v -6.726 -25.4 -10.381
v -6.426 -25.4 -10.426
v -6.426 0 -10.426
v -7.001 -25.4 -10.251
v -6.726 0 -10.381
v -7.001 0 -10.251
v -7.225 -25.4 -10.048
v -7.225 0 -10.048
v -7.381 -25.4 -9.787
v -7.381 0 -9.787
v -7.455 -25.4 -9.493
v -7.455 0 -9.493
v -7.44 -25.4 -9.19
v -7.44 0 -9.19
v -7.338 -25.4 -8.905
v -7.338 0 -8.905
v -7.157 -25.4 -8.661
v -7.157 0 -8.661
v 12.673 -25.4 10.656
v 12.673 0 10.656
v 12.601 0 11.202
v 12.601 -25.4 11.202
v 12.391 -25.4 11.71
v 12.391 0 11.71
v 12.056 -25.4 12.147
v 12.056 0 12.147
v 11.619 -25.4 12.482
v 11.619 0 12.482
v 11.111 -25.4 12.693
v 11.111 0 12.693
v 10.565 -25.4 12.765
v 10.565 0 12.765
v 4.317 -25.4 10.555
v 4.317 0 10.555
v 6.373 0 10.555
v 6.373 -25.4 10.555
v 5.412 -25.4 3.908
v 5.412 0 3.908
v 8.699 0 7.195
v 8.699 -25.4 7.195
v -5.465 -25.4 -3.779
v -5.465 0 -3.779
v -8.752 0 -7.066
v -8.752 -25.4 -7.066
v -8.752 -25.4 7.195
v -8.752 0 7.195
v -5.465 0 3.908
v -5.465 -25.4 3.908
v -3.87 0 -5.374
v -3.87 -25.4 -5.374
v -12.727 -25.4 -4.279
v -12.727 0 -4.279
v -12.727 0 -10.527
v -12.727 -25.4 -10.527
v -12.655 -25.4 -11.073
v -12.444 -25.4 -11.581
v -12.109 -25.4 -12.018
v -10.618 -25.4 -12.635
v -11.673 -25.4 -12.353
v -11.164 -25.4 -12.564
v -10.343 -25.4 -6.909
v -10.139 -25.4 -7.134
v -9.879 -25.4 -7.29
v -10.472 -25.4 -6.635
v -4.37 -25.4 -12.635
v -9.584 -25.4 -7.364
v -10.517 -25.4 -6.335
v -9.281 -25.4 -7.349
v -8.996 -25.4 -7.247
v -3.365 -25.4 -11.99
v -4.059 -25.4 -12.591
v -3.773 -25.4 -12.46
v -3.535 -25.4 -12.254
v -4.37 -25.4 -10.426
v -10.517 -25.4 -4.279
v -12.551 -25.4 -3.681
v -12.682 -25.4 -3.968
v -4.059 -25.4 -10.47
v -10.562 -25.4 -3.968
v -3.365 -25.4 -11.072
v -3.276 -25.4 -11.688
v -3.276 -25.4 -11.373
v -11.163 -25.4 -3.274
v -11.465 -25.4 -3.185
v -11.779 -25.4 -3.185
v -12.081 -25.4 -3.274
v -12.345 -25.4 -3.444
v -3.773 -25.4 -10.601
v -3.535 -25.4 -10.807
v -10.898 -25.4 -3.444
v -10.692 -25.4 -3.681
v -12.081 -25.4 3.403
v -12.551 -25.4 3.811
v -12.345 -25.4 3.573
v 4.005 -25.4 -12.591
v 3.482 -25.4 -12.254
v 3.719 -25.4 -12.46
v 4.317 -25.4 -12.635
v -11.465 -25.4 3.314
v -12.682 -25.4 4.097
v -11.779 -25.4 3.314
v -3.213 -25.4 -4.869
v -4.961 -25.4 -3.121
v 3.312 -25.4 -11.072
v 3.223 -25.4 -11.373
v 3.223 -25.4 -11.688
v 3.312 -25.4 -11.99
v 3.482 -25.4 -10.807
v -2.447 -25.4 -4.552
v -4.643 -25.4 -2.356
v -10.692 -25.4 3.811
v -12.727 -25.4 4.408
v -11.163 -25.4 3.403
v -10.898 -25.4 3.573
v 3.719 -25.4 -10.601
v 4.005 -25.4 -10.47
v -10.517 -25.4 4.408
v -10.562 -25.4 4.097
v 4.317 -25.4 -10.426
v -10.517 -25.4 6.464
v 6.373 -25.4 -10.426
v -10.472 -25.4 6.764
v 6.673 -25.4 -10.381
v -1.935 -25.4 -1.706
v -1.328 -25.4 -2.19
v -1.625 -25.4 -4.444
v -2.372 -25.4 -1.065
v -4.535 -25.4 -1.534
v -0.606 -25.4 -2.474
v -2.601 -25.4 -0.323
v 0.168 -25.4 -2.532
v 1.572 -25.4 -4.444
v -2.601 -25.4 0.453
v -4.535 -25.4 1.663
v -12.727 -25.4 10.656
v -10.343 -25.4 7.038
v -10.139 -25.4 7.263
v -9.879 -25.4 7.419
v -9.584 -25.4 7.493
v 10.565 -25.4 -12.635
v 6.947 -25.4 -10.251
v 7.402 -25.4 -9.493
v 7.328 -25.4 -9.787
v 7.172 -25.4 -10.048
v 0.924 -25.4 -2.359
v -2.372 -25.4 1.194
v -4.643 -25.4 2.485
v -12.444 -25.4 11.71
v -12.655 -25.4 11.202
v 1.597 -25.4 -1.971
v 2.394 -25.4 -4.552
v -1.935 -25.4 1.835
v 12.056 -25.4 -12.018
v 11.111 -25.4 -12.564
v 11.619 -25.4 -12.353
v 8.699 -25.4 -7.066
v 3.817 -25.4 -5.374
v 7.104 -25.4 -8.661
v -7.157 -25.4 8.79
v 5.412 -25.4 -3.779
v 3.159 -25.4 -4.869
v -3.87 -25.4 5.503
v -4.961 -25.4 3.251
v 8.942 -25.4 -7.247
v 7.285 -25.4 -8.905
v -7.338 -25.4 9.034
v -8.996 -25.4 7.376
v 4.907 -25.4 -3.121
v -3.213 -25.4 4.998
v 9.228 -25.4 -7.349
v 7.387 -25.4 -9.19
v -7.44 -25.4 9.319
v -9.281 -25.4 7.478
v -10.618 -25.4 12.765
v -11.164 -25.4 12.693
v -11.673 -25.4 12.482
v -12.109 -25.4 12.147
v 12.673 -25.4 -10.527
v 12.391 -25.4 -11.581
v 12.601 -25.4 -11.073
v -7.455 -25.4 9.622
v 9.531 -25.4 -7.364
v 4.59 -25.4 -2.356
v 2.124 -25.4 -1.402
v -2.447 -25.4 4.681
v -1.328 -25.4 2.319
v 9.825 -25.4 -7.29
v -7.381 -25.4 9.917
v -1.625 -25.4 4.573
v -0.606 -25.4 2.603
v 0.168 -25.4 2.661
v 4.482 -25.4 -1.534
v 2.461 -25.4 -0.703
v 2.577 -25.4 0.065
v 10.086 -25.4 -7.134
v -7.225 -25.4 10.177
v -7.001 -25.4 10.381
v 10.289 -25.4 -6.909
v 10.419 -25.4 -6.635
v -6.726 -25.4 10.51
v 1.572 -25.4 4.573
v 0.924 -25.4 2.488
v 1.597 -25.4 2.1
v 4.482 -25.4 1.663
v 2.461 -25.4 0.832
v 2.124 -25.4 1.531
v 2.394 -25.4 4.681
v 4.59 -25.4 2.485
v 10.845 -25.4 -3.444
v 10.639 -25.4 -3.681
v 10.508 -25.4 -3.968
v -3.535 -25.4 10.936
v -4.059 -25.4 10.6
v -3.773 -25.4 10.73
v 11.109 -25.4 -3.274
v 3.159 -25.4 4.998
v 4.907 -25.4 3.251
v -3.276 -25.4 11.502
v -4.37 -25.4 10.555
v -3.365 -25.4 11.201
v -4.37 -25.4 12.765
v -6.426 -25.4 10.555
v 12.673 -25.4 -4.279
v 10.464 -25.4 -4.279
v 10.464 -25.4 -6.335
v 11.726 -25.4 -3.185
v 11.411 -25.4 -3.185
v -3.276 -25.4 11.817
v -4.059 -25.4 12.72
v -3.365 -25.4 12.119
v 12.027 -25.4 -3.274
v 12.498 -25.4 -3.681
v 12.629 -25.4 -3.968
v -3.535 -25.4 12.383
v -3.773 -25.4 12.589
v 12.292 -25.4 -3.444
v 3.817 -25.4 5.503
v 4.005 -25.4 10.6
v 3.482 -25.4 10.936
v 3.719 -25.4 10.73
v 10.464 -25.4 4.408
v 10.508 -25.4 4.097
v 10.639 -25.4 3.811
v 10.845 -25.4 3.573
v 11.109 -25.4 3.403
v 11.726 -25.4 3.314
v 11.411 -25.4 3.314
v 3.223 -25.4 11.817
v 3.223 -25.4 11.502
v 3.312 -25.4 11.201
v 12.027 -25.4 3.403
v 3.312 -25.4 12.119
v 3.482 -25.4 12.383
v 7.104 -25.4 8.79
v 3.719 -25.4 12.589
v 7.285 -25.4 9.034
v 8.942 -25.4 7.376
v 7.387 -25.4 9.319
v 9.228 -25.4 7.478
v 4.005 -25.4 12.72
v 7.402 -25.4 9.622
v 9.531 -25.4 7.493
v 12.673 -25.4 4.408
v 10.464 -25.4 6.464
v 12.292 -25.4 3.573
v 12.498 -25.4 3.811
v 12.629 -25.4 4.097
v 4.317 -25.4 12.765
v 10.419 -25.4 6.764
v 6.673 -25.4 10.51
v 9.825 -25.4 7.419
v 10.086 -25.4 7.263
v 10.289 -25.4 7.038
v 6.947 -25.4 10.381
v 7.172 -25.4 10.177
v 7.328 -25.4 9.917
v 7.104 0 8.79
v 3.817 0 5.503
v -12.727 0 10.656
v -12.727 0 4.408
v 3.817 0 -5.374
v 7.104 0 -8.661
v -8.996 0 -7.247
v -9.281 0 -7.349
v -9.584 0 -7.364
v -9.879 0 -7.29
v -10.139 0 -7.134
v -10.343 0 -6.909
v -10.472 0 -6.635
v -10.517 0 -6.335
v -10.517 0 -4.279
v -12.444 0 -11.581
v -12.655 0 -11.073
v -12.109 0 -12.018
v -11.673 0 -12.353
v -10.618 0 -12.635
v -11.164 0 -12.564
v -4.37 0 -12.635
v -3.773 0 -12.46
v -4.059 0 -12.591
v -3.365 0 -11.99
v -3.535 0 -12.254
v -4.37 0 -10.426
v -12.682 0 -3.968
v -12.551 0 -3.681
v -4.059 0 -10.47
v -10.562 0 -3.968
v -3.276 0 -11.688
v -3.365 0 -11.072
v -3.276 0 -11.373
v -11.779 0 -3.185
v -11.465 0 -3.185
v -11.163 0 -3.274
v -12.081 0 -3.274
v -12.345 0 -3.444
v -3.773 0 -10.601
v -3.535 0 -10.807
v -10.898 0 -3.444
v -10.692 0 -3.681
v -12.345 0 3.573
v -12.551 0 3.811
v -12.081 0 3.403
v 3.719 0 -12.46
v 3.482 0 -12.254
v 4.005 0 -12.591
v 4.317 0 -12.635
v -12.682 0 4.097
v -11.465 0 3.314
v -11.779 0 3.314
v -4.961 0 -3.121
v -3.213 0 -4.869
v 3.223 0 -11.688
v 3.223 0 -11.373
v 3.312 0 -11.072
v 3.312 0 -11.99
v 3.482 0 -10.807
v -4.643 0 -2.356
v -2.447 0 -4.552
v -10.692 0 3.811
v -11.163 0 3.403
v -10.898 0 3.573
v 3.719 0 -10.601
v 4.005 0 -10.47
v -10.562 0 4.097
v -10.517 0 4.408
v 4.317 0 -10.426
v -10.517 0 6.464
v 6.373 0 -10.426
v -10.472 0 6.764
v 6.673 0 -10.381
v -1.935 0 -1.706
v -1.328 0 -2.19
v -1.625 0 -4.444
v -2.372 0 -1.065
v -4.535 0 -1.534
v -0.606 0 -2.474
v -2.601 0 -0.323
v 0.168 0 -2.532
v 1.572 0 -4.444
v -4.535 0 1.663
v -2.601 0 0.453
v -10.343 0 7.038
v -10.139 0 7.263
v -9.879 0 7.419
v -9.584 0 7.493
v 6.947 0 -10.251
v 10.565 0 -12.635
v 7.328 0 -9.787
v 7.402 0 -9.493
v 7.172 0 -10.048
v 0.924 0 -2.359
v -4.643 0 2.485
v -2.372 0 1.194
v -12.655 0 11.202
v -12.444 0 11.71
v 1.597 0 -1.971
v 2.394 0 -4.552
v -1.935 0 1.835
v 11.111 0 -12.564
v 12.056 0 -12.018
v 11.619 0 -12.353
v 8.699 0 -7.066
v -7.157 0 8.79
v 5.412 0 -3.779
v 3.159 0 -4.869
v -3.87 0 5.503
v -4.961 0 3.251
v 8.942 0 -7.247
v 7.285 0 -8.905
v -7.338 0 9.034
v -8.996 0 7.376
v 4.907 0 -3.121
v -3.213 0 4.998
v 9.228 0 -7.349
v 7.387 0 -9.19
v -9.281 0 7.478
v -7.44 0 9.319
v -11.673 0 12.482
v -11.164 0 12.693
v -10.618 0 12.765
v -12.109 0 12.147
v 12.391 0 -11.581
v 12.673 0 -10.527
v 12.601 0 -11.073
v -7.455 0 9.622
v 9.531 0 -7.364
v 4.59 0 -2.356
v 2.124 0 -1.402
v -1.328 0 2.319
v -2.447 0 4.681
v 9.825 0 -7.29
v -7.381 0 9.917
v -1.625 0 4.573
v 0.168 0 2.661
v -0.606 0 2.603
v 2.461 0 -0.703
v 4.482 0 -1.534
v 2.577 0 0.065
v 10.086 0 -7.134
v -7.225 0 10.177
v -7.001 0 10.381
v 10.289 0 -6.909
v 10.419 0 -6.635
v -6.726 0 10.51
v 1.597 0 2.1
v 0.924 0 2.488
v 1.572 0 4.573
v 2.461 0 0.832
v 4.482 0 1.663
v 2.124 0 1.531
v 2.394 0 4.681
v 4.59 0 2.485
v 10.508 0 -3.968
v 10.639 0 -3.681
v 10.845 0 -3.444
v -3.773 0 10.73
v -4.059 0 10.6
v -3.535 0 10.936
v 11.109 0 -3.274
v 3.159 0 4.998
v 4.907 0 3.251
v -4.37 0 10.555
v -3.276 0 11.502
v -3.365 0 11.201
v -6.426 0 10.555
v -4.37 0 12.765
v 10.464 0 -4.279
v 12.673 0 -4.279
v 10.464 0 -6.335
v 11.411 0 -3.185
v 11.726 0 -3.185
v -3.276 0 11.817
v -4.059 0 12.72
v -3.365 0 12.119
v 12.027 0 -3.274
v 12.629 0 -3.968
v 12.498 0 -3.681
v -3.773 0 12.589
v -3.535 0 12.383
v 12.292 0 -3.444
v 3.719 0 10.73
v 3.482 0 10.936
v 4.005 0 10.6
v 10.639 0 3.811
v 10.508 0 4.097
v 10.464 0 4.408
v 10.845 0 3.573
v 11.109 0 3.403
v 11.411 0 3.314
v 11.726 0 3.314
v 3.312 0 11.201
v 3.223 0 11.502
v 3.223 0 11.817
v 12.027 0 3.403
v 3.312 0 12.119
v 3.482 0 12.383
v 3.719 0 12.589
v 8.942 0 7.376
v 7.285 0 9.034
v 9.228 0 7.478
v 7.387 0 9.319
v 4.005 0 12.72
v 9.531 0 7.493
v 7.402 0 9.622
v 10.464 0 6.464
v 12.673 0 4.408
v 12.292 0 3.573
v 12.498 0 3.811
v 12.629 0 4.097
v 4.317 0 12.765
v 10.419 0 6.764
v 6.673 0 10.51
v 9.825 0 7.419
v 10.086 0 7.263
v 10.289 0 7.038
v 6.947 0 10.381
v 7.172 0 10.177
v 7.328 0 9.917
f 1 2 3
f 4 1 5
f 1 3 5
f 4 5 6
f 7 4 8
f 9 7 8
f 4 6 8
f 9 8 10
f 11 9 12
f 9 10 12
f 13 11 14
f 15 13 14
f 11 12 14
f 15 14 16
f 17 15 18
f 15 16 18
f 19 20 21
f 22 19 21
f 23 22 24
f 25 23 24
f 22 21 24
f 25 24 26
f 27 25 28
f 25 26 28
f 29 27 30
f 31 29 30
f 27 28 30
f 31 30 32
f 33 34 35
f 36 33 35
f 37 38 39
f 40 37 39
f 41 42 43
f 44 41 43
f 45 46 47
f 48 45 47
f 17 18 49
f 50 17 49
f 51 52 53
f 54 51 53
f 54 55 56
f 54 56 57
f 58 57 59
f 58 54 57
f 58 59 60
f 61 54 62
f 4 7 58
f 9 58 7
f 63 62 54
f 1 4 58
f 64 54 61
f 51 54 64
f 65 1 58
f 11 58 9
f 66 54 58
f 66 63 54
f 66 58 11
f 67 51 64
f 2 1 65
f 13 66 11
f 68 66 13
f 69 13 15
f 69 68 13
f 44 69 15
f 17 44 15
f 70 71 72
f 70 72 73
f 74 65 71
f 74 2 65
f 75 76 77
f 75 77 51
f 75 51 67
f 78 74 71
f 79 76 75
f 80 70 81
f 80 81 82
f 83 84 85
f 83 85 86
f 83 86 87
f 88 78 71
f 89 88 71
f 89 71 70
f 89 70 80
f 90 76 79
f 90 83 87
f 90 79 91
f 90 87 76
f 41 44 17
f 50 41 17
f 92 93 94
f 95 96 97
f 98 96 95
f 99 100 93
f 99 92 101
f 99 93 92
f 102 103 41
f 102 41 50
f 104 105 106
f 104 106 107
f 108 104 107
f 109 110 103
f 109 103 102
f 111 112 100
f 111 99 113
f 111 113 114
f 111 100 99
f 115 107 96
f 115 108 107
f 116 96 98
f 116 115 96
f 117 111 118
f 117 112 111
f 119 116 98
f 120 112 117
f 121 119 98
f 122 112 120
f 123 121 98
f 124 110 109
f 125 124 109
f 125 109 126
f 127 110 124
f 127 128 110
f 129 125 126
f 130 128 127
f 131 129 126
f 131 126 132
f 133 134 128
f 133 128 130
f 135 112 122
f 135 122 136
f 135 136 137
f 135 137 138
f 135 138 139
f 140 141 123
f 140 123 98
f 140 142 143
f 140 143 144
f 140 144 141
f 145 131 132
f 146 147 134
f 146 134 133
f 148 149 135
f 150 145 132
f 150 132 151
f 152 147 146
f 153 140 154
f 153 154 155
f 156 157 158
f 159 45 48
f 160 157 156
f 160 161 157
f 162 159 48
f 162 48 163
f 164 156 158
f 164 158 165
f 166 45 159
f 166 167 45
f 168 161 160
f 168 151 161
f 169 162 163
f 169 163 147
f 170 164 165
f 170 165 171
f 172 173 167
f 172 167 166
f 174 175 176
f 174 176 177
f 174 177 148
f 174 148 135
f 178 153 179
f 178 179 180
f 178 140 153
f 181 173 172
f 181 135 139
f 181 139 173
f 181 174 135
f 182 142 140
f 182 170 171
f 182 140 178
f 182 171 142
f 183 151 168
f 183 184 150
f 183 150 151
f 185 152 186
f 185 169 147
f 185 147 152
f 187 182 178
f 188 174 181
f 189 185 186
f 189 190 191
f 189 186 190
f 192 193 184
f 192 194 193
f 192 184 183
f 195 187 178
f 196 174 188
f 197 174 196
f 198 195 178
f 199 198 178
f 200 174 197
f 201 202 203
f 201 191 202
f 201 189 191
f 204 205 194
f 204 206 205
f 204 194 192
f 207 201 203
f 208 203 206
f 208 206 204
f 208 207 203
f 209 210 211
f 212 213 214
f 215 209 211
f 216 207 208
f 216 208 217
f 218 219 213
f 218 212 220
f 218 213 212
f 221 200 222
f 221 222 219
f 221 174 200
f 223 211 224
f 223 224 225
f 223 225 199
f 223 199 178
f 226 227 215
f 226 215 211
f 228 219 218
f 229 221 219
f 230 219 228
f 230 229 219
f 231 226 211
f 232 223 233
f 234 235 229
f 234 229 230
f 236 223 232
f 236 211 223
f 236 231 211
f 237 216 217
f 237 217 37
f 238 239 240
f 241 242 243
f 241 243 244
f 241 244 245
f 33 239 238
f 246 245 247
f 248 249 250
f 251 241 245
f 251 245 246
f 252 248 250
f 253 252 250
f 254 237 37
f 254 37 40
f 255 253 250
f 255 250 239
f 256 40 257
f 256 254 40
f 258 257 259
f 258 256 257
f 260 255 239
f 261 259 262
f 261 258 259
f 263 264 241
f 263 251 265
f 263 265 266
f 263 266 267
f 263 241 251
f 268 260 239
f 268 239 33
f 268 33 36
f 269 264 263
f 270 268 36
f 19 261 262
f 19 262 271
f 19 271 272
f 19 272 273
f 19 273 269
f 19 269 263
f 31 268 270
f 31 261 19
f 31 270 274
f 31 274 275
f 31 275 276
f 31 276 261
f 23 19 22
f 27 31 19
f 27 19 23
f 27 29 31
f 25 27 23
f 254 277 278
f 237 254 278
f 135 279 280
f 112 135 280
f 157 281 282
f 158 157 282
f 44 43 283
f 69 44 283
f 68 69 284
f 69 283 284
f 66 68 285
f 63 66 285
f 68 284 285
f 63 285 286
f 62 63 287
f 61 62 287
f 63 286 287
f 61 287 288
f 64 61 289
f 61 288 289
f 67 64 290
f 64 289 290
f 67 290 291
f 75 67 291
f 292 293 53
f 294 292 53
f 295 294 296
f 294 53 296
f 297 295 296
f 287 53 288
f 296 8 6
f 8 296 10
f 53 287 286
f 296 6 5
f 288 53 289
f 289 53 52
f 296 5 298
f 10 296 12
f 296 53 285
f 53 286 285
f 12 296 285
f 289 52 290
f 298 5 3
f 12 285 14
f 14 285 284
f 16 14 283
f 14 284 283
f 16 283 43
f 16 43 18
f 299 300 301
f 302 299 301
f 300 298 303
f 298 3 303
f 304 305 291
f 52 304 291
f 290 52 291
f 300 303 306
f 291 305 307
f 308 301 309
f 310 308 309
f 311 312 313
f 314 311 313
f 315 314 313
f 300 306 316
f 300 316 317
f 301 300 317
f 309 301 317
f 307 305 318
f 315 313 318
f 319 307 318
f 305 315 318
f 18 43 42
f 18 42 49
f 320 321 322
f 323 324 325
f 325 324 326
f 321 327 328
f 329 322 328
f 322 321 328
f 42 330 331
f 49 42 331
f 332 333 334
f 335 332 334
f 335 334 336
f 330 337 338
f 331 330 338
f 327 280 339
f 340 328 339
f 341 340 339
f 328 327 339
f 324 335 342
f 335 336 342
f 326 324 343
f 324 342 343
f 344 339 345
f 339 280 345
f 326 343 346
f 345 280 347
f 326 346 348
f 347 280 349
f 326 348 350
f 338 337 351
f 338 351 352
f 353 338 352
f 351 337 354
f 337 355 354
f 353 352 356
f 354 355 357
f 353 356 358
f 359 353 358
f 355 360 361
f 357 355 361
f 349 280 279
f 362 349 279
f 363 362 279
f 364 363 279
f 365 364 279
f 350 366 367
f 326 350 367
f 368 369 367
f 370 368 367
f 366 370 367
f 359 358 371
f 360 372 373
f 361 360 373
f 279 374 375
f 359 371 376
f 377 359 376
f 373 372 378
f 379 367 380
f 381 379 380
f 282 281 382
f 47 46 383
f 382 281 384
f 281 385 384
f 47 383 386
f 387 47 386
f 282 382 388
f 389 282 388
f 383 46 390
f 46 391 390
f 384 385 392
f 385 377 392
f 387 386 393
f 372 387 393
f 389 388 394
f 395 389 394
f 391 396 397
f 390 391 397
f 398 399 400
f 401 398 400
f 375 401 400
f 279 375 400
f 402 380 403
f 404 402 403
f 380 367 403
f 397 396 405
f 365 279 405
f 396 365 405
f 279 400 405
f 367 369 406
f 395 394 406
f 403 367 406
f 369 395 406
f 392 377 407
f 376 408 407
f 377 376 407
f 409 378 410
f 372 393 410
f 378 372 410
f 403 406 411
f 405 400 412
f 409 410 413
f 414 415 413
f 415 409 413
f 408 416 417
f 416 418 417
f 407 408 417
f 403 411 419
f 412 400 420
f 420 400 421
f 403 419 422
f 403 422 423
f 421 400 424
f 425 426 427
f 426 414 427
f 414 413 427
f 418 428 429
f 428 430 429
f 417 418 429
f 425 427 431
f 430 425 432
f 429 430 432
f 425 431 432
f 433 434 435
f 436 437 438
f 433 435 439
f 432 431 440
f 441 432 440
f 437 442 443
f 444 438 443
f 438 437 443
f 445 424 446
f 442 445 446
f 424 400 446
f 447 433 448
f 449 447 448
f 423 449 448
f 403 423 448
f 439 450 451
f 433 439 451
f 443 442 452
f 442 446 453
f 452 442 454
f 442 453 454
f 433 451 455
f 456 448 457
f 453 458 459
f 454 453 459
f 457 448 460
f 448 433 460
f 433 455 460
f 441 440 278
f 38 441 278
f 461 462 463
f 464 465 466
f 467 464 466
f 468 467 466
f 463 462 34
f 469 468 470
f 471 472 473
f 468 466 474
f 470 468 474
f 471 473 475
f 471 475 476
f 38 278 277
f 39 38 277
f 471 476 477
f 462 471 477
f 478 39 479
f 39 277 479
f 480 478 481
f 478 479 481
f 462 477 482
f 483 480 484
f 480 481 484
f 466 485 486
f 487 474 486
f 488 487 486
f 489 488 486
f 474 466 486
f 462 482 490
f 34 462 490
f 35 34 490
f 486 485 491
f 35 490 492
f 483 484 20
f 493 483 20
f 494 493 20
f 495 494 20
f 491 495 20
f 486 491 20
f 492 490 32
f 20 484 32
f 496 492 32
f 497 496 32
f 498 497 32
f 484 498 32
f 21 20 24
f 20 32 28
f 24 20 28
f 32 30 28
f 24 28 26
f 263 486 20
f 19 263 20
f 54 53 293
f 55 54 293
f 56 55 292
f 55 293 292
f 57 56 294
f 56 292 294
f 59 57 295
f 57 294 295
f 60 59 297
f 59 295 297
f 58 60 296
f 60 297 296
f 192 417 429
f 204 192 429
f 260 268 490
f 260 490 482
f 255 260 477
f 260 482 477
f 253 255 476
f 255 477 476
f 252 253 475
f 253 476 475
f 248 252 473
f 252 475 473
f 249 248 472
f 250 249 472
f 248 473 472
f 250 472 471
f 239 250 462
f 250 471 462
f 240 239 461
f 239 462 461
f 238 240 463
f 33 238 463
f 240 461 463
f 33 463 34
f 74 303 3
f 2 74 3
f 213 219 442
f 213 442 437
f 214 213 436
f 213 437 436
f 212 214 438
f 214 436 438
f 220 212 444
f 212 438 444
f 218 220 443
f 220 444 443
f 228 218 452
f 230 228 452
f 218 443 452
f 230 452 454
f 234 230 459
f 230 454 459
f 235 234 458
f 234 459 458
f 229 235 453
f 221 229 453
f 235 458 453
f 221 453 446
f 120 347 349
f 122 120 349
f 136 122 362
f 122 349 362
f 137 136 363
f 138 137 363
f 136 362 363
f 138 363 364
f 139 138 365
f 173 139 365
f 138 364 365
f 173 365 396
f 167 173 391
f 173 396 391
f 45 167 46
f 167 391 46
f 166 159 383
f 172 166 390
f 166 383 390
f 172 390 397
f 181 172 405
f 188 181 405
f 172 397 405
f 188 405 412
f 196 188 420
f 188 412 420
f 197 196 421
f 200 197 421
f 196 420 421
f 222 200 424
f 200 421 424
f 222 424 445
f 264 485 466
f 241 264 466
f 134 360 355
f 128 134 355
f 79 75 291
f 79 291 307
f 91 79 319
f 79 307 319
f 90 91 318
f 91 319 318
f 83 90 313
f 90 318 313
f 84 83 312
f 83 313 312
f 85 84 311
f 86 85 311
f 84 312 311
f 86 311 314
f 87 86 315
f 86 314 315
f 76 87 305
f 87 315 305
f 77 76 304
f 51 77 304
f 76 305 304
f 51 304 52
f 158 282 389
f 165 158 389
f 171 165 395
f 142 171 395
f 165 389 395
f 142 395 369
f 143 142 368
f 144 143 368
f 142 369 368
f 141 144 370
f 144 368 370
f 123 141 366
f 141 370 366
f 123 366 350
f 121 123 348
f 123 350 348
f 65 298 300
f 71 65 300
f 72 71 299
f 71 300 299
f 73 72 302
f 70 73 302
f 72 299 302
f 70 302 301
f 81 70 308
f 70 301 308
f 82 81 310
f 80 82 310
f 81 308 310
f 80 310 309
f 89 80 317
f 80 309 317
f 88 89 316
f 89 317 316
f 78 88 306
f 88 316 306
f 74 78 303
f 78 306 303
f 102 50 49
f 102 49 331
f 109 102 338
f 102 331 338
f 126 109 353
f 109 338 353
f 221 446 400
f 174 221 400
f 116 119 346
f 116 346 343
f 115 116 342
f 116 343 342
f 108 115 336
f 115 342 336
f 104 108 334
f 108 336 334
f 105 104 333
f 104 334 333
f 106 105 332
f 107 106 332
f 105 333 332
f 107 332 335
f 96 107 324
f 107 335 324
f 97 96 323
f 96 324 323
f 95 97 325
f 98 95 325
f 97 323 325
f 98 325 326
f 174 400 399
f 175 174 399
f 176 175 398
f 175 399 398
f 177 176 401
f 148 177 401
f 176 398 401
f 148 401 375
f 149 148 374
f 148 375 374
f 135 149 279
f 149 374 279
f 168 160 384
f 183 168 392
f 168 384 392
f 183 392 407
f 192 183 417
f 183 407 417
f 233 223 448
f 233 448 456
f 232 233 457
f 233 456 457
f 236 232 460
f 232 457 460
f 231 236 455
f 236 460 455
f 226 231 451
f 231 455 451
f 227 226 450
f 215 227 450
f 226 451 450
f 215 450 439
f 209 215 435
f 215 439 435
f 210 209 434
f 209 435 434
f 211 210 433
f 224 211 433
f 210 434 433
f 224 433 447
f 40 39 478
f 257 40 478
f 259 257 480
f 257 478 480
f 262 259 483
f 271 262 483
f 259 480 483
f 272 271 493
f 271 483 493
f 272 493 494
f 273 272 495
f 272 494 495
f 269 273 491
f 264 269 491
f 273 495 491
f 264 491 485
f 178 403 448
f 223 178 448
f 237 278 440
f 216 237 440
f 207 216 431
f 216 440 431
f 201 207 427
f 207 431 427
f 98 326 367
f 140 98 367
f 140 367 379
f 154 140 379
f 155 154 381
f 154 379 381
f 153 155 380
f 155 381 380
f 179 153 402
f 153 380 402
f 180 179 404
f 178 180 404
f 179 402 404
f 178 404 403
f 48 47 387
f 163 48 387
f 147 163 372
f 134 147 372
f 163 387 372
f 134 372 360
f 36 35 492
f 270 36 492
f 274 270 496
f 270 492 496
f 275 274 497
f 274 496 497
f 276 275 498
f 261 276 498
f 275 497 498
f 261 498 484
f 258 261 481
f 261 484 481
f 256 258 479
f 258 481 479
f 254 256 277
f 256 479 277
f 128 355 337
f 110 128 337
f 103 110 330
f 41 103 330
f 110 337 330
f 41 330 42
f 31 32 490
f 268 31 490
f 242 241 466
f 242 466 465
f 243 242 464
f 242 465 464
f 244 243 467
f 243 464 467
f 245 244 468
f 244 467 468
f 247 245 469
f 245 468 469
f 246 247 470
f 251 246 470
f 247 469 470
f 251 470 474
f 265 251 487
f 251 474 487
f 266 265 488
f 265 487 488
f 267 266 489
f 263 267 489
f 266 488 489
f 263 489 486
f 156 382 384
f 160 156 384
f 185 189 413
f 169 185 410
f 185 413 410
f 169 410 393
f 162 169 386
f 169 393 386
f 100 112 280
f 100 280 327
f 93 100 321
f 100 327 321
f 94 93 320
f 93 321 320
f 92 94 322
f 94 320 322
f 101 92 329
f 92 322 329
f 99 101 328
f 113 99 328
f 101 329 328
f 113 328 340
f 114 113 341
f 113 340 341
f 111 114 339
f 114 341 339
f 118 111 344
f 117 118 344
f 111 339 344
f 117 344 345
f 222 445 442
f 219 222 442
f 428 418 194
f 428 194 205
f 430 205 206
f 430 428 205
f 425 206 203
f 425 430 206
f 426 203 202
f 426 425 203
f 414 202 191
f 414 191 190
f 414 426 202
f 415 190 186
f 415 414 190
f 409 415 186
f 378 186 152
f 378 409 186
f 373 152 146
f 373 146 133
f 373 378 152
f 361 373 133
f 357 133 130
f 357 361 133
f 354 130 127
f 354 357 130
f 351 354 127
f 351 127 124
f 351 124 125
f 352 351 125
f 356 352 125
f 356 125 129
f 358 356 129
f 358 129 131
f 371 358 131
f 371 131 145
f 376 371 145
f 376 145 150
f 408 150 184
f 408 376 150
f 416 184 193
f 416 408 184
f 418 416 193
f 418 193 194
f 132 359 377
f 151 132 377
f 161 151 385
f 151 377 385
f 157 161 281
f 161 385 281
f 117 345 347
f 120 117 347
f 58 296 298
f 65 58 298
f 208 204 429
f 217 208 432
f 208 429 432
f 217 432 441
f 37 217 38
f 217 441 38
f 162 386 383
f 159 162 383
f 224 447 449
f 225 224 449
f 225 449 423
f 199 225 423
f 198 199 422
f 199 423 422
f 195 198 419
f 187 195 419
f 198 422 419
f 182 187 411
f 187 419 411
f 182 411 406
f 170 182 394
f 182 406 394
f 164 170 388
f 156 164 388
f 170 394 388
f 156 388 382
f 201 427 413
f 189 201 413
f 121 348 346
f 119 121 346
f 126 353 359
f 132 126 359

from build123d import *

# Parameters (mm, degrees)
F0_R     = 2.6035
F1_DEPTH = 25.4


with BuildPart() as f1:
    # F0 (on Front) → F1 (new body)
    with BuildSketch(Plane.XZ):
        with BuildLine():
            Line((-4.370089, 12.764578), (-10.618489, 12.764578))
            ThreePointArc((-10.618489, 12.764578), (-12.109211, 12.147101), (-12.726689, 10.656378))
            Line((-12.726689, 10.656378), (-12.726689, 4.407978))
            ThreePointArc((-12.726689, 4.407978), (-11.621789, 3.303078), (-10.516889, 4.407978))
            Line((-10.516889, 4.407978), (-10.516889, 6.464108))
            ThreePointArc((-10.516889, 6.464108), (-9.878719, 7.419196), (-8.752116, 7.195101))
            Line((-8.752116, 7.195101), (-5.465125, 3.90811))
            ThreePointArc((-5.465125, 3.90811), (-4.776871, 2.878066), (-4.535189, 1.663046))
            Line((-4.535189, 1.663046), (-4.535189, -1.533889))
            ThreePointArc((-4.535189, -1.533889), (-4.776871, -2.748909), (-5.465125, -3.778953))
            Line((-5.465125, -3.778953), (-8.752116, -7.065945))
            ThreePointArc((-8.752116, -7.065945), (-9.878719, -7.29004), (-10.516889, -6.334952))
            Line((-10.516889, -6.334952), (-10.516889, -4.278822))
            ThreePointArc((-10.516889, -4.278822), (-11.621789, -3.173922), (-12.726689, -4.278822))
            Line((-12.726689, -4.278822), (-12.726689, -10.527222))
            ThreePointArc((-12.726689, -10.527222), (-12.109211, -12.017944), (-10.618489, -12.635422))
            Line((-10.618489, -12.635422), (-4.370089, -12.635422))
            ThreePointArc((-4.370089, -12.635422), (-3.265189, -11.530522), (-4.370089, -10.425622))
            Line((-4.370089, -10.425622), (-6.426219, -10.425622))
            ThreePointArc((-6.426219, -10.425622), (-7.381307, -9.787452), (-7.157212, -8.660849))
            Line((-7.157212, -8.660849), (-3.87022, -5.373858))
            ThreePointArc((-3.87022, -5.373858), (-2.840176, -4.685604), (-1.625156, -4.443922))
            Line((-1.625156, -4.443922), (1.571779, -4.443922))
            ThreePointArc((1.571779, -4.443922), (2.786799, -4.685604), (3.816843, -5.373858))
            Line((3.816843, -5.373858), (7.103834, -8.660849))
            ThreePointArc((7.103834, -8.660849), (7.327929, -9.787452), (6.372841, -10.425622))
            Line((6.372841, -10.425622), (4.316711, -10.425622))
            ThreePointArc((4.316711, -10.425622), (3.211811, -11.530522), (4.316711, -12.635422))
            Line((4.316711, -12.635422), (10.565111, -12.635422))
            ThreePointArc((10.565111, -12.635422), (12.055834, -12.017944), (12.673311, -10.527222))
            Line((12.673311, -10.527222), (12.673311, -4.278822))
            ThreePointArc((12.673311, -4.278822), (11.568411, -3.173922), (10.463511, -4.278822))
            Line((10.463511, -4.278822), (10.463511, -6.334952))
            ThreePointArc((10.463511, -6.334952), (9.825342, -7.29004), (8.698738, -7.065945))
            Line((8.698738, -7.065945), (5.411747, -3.778953))
            ThreePointArc((5.411747, -3.778953), (4.723494, -2.748909), (4.481811, -1.533889))
            Line((4.481811, -1.533889), (4.481811, 1.663046))
            ThreePointArc((4.481811, 1.663046), (4.723494, 2.878066), (5.411747, 3.90811))
            Line((5.411747, 3.90811), (8.698738, 7.195101))
            ThreePointArc((8.698738, 7.195101), (9.825342, 7.419196), (10.463511, 6.464108))
            Line((10.463511, 6.464108), (10.463511, 4.407978))
            ThreePointArc((10.463511, 4.407978), (11.568411, 3.303078), (12.673311, 4.407978))
            Line((12.673311, 4.407978), (12.673311, 10.656378))
            ThreePointArc((12.673311, 10.656378), (12.055834, 12.147101), (10.565111, 12.764578))
            Line((10.565111, 12.764578), (4.316711, 12.764578))
            ThreePointArc((4.316711, 12.764578), (3.211811, 11.659678), (4.316711, 10.554778))
            Line((4.316711, 10.554778), (6.372841, 10.554778))
            ThreePointArc((6.372841, 10.554778), (7.327929, 9.916609), (7.103834, 8.790005))
            Line((7.103834, 8.790005), (3.816843, 5.503014))
            ThreePointArc((3.816843, 5.503014), (2.786799, 4.814761), (1.571779, 4.573078))
            Line((1.571779, 4.573078), (-1.625156, 4.573078))
            ThreePointArc((-1.625156, 4.573078), (-2.840176, 4.814761), (-3.87022, 5.503014))
            Line((-3.87022, 5.503014), (-7.157212, 8.790005))
            ThreePointArc((-7.157212, 8.790005), (-7.381307, 9.916609), (-6.426219, 10.554778))
            Line((-6.426219, 10.554778), (-4.370089, 10.554778))
            ThreePointArc((-4.370089, 10.554778), (-3.265189, 11.659678), (-4.370089, 12.764578))
        make_face()
        with Locations((-0.026689, 0.064578)):
            Circle(F0_R, mode=Mode.SUBTRACT)
    extrude(amount=F1_DEPTH)


solid = f1.part
